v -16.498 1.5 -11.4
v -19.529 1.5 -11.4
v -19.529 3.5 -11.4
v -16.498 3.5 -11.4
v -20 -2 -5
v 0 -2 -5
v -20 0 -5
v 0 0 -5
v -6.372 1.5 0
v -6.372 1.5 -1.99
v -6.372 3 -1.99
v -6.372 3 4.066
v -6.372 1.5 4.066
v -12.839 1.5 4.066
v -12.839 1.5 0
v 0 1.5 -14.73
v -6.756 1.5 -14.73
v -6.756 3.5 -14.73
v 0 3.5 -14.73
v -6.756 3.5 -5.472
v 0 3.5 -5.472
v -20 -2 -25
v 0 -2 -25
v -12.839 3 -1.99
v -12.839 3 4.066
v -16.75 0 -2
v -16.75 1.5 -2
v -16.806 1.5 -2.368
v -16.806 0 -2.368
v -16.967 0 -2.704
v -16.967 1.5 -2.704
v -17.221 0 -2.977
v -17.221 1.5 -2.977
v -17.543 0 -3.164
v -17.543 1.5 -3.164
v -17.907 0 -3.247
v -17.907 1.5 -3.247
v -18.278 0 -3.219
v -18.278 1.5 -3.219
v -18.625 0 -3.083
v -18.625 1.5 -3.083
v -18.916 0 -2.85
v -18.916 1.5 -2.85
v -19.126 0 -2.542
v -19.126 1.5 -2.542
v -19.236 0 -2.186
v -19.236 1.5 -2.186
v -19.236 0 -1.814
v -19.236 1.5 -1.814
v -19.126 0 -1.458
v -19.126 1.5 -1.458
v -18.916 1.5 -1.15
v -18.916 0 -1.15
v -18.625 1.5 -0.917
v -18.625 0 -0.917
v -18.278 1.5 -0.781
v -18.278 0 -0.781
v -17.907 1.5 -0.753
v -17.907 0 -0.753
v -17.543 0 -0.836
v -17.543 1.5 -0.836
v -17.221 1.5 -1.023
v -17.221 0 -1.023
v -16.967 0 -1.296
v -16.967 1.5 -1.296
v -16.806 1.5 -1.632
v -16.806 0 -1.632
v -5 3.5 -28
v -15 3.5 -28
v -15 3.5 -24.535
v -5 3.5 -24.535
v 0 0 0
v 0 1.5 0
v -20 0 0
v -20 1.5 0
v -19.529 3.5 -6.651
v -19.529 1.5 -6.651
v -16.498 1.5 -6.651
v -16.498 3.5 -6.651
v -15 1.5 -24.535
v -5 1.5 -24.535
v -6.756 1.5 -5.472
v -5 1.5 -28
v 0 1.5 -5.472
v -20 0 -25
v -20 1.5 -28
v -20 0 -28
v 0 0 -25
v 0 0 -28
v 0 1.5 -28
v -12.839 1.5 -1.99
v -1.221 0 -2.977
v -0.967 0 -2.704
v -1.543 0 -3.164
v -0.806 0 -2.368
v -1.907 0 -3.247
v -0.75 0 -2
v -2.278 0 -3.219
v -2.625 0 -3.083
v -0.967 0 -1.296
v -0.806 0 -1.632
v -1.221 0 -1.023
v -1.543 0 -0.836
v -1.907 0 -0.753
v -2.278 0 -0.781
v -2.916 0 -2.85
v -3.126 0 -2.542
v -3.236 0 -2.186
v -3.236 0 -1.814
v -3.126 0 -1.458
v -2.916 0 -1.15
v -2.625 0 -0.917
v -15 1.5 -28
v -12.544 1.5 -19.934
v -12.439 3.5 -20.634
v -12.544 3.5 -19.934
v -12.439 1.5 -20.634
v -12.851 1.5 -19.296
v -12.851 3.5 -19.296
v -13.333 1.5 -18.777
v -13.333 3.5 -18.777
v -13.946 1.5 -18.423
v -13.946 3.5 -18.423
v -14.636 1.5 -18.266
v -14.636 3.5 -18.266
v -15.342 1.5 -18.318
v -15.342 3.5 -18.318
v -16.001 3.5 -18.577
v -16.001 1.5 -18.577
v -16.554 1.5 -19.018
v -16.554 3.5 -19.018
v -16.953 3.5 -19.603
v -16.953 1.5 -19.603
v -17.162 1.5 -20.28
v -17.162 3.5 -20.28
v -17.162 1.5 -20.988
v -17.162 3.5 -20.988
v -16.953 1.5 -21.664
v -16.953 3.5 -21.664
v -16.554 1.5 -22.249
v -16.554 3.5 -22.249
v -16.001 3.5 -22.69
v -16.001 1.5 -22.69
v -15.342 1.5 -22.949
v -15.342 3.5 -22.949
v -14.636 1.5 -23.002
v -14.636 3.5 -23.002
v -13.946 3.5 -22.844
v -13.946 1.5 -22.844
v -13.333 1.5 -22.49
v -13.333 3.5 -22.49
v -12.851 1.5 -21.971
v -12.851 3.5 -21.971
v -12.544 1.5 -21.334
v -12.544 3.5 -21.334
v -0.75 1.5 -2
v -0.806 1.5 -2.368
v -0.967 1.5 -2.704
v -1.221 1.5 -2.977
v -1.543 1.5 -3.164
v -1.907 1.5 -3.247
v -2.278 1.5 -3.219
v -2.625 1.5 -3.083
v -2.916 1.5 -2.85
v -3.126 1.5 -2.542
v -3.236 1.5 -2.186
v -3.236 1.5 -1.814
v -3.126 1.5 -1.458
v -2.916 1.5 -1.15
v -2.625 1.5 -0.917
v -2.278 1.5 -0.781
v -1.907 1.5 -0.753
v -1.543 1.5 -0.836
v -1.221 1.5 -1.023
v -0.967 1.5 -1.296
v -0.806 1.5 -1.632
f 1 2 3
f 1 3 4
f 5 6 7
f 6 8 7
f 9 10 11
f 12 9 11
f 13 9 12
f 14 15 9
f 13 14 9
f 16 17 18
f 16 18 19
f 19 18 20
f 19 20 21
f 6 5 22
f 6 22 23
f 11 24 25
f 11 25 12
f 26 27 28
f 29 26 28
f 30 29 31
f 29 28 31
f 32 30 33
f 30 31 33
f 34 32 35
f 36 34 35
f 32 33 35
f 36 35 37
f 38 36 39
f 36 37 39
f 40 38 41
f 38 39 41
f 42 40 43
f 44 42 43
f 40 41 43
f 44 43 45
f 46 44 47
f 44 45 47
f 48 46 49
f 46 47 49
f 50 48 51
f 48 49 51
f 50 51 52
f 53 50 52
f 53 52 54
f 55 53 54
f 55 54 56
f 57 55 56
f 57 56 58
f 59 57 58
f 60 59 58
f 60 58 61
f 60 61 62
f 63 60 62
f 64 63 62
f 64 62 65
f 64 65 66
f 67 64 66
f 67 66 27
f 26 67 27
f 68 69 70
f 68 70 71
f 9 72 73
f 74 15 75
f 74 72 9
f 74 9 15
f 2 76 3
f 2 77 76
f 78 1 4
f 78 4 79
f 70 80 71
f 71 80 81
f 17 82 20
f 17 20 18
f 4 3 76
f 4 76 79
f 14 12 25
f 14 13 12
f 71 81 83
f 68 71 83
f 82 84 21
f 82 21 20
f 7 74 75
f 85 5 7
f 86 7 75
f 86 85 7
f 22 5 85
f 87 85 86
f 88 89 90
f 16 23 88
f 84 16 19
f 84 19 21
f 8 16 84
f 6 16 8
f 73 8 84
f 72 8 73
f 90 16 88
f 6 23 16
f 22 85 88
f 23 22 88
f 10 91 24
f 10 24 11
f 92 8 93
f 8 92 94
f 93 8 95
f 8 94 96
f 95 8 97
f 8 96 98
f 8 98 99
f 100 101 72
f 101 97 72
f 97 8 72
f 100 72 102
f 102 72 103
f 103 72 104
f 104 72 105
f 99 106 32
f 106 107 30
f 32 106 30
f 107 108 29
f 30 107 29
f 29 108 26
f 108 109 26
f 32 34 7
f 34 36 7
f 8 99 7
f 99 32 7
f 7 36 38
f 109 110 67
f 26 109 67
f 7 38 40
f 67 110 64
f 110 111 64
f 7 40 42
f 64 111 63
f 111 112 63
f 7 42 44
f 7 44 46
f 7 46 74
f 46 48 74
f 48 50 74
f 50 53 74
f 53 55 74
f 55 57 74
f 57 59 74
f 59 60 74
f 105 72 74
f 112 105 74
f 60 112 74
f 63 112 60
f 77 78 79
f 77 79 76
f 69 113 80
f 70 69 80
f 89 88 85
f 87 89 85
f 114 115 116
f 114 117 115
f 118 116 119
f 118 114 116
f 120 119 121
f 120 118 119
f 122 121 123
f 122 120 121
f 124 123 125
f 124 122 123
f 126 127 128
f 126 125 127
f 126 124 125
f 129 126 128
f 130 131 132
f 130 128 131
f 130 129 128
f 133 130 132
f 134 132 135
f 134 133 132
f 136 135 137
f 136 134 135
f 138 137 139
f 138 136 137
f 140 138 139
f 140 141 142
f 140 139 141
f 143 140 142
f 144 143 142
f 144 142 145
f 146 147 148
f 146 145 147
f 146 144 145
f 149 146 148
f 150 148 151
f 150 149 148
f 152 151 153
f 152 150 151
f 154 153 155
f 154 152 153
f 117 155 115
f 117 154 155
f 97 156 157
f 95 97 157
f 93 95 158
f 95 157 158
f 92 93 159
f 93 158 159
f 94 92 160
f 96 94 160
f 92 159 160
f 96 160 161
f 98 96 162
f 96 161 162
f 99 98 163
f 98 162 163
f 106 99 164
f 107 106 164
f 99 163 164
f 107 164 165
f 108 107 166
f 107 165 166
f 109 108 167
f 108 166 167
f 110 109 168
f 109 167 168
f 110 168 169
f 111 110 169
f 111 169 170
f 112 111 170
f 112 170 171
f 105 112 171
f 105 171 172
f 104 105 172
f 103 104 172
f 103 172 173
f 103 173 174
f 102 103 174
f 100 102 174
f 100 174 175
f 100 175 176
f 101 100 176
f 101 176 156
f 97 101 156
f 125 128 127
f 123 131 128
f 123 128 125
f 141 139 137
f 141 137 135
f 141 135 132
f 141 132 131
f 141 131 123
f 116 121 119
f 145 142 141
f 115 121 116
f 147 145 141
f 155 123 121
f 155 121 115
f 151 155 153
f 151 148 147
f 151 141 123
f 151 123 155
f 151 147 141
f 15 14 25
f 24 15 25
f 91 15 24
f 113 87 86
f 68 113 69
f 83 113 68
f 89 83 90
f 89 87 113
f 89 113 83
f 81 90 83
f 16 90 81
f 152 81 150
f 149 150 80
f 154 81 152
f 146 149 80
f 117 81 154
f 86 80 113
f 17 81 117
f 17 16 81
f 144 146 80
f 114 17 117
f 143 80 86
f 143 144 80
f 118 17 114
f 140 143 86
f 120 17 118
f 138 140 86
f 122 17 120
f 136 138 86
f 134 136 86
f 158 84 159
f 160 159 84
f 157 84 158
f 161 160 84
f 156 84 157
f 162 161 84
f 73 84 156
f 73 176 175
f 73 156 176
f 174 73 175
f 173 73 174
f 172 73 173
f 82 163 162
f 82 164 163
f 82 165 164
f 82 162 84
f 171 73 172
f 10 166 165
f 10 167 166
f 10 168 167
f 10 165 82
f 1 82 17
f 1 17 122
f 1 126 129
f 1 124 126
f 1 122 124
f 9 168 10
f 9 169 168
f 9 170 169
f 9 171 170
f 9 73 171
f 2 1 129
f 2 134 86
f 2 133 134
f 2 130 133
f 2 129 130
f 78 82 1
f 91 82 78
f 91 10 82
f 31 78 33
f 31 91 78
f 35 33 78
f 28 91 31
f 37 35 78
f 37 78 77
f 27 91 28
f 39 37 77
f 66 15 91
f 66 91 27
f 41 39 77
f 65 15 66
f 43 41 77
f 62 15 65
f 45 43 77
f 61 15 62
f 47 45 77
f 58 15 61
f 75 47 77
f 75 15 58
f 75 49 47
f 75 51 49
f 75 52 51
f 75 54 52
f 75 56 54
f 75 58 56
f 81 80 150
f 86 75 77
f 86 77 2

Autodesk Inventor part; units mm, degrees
ref_plane "YZ Plane" through (0, 0, 0) normal (1, 0, 0) x (0, 1, 0)
ref_plane "XZ Plane" through (0, 0, 0) normal (0, 1, 0) x (-1, 0, 0)
ref_plane "XY Plane" through (0, 0, 0) normal (0, 0, 1) x (1, 0, 0)
sketch "Sketch1" plane through (0, 0, 0) normal (0, 1, 0) x (-1, 0, 0)
  line L0 (0, 0) -> (20, 0)
  line L1 (20, 0) -> (20, -28)
  line L2 (20, -28) -> (0, -28)
  line L3 (0, -28) -> (0, 0)
  dimension "d0" = 28
  dimension "d1" = 20
extrude "Extrusion1" add sketch "Sketch1" along normal blind 1.5
sketch "Sketch2" plane through (0, 1.5, 0) normal (0, 1, 0) x (1, 0, 0)
  line L0 (0, 28) -> (-20, 28) projected
  line L1 (-5, 28) -> (-15, 28)
  line L2 (-15, 28) -> (-15, 24.5354)
  line L3 (-15, 24.5354) -> (-5, 24.5354)
  line L4 (-5, 24.5354) -> (-5, 28)
  point P0 (0, 0)
  point P1 (-10, 24.5354)
  point P2 (-10, 28)
  dimension "d4" = 10
extrude "Extrusion2" add sketch "Sketch2" along normal blind 2
sketch "Sketch3" plane through (0, 1.5, 0) normal (0, 1, 0) x (1, 0, 0)
  line L0 (0, 0) -> (0, 28) projected
  line L1 (0, 5.4716) -> (-6.7562, 5.4716)
  line L2 (-6.7562, 5.4716) -> (-6.7562, 14.73)
  line L3 (-6.7562, 14.73) -> (0, 14.73)
  line L4 (0, 14.73) -> (0, 5.4716)
extrude "Extrusion3" add sketch "Sketch3" along normal blind 2
sketch "Sketch4" plane through (0, 1.5, 0) normal (0, 1, 0) x (1, 0, 0)
  circle A0 centre (-14.8135, 20.6337) radius 2.3748
  point P0 (0, 0)
extrude "Extrusion4" add sketch "Sketch4" along normal blind 2
sketch "Sketch5" plane through (0, 1.5, 0) normal (0, 1, 0) x (1, 0, 0)
  circle A0 centre (-2, 2) radius 1.25
  circle A1 centre (-18, 2) radius 1.25
  line L0 (0, 0) -> (0, 5.4716) projected
  line L1 (-20, 0) -> (0, 0) projected
  line L2 (-20, 28) -> (-20, 0) projected
  dimension "d11" = 2
  dimension "d12" = 2.5
  dimension "d13" = 2
  dimension "d14" = 2
  dimension "d15" = 2
  dimension "d16" = 2.5
extrude "Extrusion5" cut sketch "Sketch5" against normal blind 2
sketch "Sketch6" plane through (0, 0, 0) normal (0, -1, 0) x (1, 0, 0)
  line L0 (-20, 0) -> (-20, -28) projected
  line L1 (-20, -25) -> (0, -25)
  line L2 (0, -25) -> (0, -5)
  line L3 (0, -5) -> (-20, -5)
  line L4 (-20, -5) -> (-20, -25)
  line L5 (-20, -28) -> (0, -28) projected
  line L6 (0, 0) -> (-20, 0) projected
  dimension "d19" = 3
  dimension "d20" = 5
extrude "Extrusion6" add sketch "Sketch6" along normal blind 2
sketch "Sketch7" plane through (0, 1.5, 0) normal (0, 1, 0) x (1, 0, 0)
  line L0 (-16.4979, 6.6511) -> (-19.5294, 6.6511)
  line L1 (-19.5294, 6.6511) -> (-19.5294, 11.4005)
  line L2 (-19.5294, 11.4005) -> (-16.4979, 11.4005)
  line L3 (-16.4979, 11.4005) -> (-16.4979, 6.6511)
  point P0 (0, 0)
extrude "Extrusion7" add sketch "Sketch7" along normal blind 2
sketch "Sketch8" plane through (0, 1.5, 0) normal (0, 1, 0) x (1, 0, 0)
  line L0 (-12.8387, 1.9896) -> (-6.3724, 1.9896)
  line L1 (-6.3724, 1.9896) -> (-6.3724, -4.0656)
  line L2 (-6.3724, -4.0656) -> (-12.8387, -4.0656)
  line L3 (-12.8387, -4.0656) -> (-12.8387, 1.9896)
  point P0 (0, 0)
extrude "Extrusion8" add sketch "Sketch8" along normal blind 1.5
equation "\"d16\" = d12"
properties part number "VideoTransmitter" material "ABS Plastic"
